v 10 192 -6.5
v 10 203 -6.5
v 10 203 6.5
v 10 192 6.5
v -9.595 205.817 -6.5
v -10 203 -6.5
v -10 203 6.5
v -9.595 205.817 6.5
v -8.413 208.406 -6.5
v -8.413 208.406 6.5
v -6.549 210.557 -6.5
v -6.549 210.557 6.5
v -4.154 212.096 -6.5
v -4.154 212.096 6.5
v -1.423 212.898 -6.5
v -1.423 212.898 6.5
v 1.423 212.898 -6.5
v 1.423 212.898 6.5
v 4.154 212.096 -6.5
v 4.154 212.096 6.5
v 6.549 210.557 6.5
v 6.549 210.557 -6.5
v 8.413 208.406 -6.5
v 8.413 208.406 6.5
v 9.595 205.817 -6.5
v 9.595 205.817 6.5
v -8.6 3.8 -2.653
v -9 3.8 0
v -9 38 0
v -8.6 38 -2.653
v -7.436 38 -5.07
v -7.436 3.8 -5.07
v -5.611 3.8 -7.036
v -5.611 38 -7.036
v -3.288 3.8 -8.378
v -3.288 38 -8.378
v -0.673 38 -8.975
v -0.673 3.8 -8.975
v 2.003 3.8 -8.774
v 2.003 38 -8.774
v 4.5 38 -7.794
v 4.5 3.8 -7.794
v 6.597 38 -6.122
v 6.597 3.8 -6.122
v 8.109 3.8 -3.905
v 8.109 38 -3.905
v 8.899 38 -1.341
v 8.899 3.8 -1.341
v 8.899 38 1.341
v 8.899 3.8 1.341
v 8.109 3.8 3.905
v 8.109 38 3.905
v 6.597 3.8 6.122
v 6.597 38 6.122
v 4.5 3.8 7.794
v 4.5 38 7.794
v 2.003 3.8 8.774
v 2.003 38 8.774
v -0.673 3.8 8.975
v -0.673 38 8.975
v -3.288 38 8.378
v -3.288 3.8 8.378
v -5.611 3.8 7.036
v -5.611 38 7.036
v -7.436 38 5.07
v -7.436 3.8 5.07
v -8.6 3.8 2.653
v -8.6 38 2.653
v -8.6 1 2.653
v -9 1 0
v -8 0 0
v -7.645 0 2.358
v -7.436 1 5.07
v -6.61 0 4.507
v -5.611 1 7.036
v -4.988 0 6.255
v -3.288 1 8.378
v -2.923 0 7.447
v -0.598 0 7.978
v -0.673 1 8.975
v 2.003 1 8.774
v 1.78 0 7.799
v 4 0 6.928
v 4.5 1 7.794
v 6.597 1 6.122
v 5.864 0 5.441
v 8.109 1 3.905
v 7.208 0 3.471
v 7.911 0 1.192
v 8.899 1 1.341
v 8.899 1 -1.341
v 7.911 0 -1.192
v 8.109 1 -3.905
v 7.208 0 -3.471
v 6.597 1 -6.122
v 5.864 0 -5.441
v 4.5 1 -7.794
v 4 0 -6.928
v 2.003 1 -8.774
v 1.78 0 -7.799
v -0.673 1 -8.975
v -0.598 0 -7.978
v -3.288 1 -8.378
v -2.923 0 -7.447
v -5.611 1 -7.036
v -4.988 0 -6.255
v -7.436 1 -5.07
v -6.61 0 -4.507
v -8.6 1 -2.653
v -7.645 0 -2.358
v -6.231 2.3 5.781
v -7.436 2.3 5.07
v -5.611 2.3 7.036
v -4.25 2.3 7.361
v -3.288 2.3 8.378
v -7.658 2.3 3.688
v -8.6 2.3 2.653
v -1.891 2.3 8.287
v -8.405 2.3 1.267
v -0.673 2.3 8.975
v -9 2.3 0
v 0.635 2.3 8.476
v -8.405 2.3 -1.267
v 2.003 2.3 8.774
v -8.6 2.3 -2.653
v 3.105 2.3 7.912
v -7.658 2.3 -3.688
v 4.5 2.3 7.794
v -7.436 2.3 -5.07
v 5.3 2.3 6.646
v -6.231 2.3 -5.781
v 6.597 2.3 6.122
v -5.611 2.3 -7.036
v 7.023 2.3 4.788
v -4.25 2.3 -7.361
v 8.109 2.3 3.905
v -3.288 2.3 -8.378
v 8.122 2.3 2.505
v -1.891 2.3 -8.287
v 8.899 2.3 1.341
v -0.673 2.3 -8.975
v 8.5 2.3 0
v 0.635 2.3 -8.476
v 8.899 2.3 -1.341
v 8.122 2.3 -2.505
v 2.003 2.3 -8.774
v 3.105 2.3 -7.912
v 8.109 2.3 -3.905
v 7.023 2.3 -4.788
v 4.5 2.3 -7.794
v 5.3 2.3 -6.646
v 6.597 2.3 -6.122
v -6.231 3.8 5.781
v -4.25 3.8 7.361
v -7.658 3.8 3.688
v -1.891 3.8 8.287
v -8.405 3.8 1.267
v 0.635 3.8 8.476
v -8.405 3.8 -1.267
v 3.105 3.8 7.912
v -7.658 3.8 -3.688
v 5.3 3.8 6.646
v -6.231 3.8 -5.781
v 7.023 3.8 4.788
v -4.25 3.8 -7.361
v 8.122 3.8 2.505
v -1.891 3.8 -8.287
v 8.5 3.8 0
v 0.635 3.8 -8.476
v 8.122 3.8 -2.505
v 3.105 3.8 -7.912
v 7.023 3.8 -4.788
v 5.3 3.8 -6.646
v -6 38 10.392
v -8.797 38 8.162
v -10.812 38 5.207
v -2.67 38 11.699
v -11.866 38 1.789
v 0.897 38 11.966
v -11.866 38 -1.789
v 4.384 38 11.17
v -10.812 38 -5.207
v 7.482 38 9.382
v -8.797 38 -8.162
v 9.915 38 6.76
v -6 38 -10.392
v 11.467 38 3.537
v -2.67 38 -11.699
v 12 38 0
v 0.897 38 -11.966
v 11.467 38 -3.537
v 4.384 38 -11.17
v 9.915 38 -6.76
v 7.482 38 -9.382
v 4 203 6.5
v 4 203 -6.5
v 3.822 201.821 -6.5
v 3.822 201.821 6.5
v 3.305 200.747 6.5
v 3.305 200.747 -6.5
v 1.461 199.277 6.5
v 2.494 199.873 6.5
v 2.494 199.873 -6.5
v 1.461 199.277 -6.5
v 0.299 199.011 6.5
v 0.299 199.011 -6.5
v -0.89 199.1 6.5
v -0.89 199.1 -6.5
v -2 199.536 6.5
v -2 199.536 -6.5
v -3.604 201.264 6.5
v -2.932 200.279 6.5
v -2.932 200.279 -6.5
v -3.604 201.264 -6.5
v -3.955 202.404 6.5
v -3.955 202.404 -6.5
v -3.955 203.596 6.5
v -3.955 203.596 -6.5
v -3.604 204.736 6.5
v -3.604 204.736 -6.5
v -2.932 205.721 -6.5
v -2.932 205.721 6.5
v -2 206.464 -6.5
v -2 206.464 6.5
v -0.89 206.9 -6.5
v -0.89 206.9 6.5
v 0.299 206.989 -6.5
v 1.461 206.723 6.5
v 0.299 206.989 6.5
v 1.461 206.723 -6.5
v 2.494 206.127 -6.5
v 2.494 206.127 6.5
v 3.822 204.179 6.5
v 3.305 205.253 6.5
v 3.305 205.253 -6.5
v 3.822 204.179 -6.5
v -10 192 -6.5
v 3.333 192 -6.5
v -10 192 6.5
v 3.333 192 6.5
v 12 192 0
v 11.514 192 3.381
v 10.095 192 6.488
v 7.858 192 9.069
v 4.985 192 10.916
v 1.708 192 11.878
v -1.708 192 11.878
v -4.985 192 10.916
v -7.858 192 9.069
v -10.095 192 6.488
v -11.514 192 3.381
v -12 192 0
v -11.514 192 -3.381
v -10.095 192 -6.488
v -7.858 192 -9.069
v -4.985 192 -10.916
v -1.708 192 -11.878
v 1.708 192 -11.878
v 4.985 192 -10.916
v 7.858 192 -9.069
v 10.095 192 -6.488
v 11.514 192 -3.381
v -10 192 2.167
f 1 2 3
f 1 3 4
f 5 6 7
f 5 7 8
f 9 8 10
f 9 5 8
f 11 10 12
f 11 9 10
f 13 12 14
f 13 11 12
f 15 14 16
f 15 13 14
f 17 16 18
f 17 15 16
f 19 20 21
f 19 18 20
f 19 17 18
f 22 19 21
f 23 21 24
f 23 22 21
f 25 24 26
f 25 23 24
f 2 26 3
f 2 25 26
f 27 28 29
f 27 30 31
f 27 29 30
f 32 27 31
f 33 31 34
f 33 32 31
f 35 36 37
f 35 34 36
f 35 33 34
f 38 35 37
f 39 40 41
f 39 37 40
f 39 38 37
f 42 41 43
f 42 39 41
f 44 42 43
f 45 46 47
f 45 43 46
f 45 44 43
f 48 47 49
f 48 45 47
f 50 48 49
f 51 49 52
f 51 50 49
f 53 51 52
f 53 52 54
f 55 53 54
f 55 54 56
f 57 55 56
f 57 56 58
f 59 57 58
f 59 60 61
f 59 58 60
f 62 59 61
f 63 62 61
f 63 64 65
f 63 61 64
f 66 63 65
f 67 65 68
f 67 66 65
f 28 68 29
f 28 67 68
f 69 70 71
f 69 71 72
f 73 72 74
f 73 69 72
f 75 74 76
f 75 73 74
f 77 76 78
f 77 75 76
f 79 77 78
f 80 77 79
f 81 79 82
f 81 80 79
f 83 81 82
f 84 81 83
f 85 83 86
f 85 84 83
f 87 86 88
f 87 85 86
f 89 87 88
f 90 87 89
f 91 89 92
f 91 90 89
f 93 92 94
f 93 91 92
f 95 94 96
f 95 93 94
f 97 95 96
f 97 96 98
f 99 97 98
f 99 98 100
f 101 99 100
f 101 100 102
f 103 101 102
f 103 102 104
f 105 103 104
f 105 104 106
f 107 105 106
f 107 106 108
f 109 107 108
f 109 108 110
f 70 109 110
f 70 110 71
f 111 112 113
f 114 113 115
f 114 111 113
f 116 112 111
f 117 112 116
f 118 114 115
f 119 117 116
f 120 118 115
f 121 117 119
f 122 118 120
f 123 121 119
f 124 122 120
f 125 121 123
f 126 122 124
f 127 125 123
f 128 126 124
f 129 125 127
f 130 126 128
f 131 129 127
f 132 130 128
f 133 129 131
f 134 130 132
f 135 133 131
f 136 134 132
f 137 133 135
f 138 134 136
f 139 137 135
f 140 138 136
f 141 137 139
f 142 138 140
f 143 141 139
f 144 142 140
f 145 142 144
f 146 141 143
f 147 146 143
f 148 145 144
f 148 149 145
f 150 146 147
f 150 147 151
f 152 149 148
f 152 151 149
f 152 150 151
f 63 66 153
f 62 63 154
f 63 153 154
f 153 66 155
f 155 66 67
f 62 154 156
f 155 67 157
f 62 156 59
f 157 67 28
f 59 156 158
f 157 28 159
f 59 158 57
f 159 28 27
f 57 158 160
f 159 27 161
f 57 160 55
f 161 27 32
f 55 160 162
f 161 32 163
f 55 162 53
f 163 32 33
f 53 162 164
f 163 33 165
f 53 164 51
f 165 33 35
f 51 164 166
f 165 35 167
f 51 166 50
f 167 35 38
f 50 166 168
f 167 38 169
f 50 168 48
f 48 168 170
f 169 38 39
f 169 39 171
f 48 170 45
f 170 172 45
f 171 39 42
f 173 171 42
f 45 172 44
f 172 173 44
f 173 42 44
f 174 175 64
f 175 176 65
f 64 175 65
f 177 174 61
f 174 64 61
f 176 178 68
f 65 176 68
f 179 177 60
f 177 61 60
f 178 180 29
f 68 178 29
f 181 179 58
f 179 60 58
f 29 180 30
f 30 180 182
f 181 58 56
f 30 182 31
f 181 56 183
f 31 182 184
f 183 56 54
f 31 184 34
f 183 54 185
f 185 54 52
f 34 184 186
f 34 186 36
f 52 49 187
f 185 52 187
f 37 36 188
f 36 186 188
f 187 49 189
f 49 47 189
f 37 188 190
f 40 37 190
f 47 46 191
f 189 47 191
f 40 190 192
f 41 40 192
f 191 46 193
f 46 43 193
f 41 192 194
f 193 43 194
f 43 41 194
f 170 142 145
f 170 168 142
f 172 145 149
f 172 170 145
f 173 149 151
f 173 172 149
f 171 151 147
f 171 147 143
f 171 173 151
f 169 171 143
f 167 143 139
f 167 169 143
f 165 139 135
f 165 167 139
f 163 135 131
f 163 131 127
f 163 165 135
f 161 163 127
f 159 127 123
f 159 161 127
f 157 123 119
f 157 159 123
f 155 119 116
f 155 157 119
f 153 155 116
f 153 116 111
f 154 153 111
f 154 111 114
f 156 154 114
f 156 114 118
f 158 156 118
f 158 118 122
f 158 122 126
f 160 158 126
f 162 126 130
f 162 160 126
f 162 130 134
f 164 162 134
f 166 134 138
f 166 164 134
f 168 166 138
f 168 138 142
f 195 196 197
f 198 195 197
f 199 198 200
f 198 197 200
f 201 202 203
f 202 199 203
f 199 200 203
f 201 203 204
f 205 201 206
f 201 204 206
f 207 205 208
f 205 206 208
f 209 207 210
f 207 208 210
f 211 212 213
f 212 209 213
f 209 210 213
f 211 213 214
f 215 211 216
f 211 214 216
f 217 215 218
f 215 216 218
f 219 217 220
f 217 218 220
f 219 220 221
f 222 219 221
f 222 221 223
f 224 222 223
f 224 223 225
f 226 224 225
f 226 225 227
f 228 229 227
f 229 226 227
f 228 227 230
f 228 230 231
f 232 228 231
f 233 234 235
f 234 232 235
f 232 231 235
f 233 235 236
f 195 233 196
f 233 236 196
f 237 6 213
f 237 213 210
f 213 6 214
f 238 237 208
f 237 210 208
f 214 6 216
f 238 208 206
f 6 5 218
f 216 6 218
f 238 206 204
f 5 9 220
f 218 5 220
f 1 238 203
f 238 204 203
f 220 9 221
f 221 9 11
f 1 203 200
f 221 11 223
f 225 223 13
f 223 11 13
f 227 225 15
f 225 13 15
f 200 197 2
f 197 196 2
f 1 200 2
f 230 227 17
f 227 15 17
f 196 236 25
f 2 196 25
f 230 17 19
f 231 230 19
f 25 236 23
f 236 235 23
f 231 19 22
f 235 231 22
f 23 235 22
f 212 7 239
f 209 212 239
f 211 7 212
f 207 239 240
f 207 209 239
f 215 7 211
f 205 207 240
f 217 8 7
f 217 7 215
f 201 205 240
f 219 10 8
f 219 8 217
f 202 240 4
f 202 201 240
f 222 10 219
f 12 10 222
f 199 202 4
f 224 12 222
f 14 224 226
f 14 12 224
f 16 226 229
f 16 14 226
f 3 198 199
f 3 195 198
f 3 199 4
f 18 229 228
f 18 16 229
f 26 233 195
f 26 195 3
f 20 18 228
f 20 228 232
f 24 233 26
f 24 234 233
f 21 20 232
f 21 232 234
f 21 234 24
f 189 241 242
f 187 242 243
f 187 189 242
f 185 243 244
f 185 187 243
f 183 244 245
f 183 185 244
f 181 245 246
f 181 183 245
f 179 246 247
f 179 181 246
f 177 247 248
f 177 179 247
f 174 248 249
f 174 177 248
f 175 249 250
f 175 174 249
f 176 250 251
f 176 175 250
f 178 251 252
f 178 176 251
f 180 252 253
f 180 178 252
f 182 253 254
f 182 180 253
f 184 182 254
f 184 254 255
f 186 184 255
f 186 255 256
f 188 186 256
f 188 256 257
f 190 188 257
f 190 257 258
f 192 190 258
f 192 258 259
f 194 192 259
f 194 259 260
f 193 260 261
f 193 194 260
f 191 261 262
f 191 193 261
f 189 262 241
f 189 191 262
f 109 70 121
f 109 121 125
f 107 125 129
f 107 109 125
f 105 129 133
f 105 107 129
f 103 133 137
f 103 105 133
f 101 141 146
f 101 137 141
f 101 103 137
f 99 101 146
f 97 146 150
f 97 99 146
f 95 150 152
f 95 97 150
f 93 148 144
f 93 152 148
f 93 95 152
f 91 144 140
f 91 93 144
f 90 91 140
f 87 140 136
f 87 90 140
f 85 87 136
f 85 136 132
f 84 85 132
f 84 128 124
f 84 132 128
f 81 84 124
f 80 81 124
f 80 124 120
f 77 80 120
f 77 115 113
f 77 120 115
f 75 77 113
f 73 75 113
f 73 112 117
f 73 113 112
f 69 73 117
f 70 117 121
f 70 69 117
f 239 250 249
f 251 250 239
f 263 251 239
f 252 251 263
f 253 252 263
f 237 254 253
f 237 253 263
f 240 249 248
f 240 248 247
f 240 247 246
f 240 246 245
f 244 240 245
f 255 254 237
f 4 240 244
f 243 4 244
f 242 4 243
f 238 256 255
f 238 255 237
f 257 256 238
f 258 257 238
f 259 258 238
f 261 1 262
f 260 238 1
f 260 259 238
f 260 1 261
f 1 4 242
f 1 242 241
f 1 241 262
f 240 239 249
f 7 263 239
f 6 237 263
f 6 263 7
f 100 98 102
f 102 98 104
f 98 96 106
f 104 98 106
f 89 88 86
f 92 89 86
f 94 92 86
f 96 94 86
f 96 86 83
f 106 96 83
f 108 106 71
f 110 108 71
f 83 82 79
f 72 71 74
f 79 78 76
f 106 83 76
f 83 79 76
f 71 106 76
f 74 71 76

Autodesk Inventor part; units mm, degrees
ref_plane "YZ Plane" through (0, 0, 0) normal (1, 0, 0) x (0, 1, 0)
ref_plane "XZ Plane" through (0, 0, 0) normal (0, 1, 0) x (-1, 0, 0)
ref_plane "XY Plane" through (0, 0, 0) normal (0, 0, 1) x (1, 0, 0)
sketch "Boceto1" plane through (0, 0, 0) normal (0, 1, 0) x (-1, 0, 0)
  circle A0 centre (0, 0) radius 9
  dimension "d0" = 18
extrude "Extrusión1" add sketch "Boceto1" along normal blind 38
sketch "Boceto2" plane through (0, 38, 0) normal (0, 1, 0) x (1, 0, 0)
  circle A0 centre (0, 0) radius 12
  dimension "d3" = 24
extrude "Extrusión2" add sketch "Boceto2" along normal blind 154
sketch "Boceto3" plane through (0, 0, 0) normal (0, 0, 1) x (1, 0, 0)
  line L0 (0, 0) -> (0, 203) construction
  circle A0 centre (0, 203) radius 4
  arc A1 (10, 203) -> (-10, 203) centre (0, 203) ccw
  line L1 (10, 203) -> (10, 192)
  line L2 (12, 192) -> (-12, 192) projected
  line L3 (-10, 192) -> (-10, 203)
  line L4 (-10, 192) -> (10, 192)
  dimension "d6" = 203
  dimension "d7" = 8
  dimension "d8" = 20
  dimension "d9" = 20
extrude "Extrusión3" add sketch "Boceto3" along normal mid plane 13
sketch "Boceto4" plane through (0, 0, 0) normal (0, 0, 1) x (1, 0, 0)
  line L0 (0, 0) -> (0, 3.8) construction
  line L1 (0, 3.8) -> (9, 3.8) construction
  line L2 (9, 0) -> (9, 38) projected
  line L3 (9, 3.8) -> (9, 2.3)
  line L4 (9, 2.3) -> (8.5, 2.3)
  line L5 (8.5, 2.3) -> (8.5, 3.8)
  line L6 (8.5, 3.8) -> (9, 3.8)
  dimension "d12" = 3.8
  dimension "d13" = 1.5
  dimension "d14" = 0.5
revolve "Revolución1" cut sketch "Boceto4" angle 360 about axis through (0, 0, 0) along (0, 1, 0)
chamfer "Chaflán1" distance 1 angle 45 1 edges at (9, 0, 0) measured on face at (-2.2455, 0, -1.9894)
properties part number "14_Eje"
